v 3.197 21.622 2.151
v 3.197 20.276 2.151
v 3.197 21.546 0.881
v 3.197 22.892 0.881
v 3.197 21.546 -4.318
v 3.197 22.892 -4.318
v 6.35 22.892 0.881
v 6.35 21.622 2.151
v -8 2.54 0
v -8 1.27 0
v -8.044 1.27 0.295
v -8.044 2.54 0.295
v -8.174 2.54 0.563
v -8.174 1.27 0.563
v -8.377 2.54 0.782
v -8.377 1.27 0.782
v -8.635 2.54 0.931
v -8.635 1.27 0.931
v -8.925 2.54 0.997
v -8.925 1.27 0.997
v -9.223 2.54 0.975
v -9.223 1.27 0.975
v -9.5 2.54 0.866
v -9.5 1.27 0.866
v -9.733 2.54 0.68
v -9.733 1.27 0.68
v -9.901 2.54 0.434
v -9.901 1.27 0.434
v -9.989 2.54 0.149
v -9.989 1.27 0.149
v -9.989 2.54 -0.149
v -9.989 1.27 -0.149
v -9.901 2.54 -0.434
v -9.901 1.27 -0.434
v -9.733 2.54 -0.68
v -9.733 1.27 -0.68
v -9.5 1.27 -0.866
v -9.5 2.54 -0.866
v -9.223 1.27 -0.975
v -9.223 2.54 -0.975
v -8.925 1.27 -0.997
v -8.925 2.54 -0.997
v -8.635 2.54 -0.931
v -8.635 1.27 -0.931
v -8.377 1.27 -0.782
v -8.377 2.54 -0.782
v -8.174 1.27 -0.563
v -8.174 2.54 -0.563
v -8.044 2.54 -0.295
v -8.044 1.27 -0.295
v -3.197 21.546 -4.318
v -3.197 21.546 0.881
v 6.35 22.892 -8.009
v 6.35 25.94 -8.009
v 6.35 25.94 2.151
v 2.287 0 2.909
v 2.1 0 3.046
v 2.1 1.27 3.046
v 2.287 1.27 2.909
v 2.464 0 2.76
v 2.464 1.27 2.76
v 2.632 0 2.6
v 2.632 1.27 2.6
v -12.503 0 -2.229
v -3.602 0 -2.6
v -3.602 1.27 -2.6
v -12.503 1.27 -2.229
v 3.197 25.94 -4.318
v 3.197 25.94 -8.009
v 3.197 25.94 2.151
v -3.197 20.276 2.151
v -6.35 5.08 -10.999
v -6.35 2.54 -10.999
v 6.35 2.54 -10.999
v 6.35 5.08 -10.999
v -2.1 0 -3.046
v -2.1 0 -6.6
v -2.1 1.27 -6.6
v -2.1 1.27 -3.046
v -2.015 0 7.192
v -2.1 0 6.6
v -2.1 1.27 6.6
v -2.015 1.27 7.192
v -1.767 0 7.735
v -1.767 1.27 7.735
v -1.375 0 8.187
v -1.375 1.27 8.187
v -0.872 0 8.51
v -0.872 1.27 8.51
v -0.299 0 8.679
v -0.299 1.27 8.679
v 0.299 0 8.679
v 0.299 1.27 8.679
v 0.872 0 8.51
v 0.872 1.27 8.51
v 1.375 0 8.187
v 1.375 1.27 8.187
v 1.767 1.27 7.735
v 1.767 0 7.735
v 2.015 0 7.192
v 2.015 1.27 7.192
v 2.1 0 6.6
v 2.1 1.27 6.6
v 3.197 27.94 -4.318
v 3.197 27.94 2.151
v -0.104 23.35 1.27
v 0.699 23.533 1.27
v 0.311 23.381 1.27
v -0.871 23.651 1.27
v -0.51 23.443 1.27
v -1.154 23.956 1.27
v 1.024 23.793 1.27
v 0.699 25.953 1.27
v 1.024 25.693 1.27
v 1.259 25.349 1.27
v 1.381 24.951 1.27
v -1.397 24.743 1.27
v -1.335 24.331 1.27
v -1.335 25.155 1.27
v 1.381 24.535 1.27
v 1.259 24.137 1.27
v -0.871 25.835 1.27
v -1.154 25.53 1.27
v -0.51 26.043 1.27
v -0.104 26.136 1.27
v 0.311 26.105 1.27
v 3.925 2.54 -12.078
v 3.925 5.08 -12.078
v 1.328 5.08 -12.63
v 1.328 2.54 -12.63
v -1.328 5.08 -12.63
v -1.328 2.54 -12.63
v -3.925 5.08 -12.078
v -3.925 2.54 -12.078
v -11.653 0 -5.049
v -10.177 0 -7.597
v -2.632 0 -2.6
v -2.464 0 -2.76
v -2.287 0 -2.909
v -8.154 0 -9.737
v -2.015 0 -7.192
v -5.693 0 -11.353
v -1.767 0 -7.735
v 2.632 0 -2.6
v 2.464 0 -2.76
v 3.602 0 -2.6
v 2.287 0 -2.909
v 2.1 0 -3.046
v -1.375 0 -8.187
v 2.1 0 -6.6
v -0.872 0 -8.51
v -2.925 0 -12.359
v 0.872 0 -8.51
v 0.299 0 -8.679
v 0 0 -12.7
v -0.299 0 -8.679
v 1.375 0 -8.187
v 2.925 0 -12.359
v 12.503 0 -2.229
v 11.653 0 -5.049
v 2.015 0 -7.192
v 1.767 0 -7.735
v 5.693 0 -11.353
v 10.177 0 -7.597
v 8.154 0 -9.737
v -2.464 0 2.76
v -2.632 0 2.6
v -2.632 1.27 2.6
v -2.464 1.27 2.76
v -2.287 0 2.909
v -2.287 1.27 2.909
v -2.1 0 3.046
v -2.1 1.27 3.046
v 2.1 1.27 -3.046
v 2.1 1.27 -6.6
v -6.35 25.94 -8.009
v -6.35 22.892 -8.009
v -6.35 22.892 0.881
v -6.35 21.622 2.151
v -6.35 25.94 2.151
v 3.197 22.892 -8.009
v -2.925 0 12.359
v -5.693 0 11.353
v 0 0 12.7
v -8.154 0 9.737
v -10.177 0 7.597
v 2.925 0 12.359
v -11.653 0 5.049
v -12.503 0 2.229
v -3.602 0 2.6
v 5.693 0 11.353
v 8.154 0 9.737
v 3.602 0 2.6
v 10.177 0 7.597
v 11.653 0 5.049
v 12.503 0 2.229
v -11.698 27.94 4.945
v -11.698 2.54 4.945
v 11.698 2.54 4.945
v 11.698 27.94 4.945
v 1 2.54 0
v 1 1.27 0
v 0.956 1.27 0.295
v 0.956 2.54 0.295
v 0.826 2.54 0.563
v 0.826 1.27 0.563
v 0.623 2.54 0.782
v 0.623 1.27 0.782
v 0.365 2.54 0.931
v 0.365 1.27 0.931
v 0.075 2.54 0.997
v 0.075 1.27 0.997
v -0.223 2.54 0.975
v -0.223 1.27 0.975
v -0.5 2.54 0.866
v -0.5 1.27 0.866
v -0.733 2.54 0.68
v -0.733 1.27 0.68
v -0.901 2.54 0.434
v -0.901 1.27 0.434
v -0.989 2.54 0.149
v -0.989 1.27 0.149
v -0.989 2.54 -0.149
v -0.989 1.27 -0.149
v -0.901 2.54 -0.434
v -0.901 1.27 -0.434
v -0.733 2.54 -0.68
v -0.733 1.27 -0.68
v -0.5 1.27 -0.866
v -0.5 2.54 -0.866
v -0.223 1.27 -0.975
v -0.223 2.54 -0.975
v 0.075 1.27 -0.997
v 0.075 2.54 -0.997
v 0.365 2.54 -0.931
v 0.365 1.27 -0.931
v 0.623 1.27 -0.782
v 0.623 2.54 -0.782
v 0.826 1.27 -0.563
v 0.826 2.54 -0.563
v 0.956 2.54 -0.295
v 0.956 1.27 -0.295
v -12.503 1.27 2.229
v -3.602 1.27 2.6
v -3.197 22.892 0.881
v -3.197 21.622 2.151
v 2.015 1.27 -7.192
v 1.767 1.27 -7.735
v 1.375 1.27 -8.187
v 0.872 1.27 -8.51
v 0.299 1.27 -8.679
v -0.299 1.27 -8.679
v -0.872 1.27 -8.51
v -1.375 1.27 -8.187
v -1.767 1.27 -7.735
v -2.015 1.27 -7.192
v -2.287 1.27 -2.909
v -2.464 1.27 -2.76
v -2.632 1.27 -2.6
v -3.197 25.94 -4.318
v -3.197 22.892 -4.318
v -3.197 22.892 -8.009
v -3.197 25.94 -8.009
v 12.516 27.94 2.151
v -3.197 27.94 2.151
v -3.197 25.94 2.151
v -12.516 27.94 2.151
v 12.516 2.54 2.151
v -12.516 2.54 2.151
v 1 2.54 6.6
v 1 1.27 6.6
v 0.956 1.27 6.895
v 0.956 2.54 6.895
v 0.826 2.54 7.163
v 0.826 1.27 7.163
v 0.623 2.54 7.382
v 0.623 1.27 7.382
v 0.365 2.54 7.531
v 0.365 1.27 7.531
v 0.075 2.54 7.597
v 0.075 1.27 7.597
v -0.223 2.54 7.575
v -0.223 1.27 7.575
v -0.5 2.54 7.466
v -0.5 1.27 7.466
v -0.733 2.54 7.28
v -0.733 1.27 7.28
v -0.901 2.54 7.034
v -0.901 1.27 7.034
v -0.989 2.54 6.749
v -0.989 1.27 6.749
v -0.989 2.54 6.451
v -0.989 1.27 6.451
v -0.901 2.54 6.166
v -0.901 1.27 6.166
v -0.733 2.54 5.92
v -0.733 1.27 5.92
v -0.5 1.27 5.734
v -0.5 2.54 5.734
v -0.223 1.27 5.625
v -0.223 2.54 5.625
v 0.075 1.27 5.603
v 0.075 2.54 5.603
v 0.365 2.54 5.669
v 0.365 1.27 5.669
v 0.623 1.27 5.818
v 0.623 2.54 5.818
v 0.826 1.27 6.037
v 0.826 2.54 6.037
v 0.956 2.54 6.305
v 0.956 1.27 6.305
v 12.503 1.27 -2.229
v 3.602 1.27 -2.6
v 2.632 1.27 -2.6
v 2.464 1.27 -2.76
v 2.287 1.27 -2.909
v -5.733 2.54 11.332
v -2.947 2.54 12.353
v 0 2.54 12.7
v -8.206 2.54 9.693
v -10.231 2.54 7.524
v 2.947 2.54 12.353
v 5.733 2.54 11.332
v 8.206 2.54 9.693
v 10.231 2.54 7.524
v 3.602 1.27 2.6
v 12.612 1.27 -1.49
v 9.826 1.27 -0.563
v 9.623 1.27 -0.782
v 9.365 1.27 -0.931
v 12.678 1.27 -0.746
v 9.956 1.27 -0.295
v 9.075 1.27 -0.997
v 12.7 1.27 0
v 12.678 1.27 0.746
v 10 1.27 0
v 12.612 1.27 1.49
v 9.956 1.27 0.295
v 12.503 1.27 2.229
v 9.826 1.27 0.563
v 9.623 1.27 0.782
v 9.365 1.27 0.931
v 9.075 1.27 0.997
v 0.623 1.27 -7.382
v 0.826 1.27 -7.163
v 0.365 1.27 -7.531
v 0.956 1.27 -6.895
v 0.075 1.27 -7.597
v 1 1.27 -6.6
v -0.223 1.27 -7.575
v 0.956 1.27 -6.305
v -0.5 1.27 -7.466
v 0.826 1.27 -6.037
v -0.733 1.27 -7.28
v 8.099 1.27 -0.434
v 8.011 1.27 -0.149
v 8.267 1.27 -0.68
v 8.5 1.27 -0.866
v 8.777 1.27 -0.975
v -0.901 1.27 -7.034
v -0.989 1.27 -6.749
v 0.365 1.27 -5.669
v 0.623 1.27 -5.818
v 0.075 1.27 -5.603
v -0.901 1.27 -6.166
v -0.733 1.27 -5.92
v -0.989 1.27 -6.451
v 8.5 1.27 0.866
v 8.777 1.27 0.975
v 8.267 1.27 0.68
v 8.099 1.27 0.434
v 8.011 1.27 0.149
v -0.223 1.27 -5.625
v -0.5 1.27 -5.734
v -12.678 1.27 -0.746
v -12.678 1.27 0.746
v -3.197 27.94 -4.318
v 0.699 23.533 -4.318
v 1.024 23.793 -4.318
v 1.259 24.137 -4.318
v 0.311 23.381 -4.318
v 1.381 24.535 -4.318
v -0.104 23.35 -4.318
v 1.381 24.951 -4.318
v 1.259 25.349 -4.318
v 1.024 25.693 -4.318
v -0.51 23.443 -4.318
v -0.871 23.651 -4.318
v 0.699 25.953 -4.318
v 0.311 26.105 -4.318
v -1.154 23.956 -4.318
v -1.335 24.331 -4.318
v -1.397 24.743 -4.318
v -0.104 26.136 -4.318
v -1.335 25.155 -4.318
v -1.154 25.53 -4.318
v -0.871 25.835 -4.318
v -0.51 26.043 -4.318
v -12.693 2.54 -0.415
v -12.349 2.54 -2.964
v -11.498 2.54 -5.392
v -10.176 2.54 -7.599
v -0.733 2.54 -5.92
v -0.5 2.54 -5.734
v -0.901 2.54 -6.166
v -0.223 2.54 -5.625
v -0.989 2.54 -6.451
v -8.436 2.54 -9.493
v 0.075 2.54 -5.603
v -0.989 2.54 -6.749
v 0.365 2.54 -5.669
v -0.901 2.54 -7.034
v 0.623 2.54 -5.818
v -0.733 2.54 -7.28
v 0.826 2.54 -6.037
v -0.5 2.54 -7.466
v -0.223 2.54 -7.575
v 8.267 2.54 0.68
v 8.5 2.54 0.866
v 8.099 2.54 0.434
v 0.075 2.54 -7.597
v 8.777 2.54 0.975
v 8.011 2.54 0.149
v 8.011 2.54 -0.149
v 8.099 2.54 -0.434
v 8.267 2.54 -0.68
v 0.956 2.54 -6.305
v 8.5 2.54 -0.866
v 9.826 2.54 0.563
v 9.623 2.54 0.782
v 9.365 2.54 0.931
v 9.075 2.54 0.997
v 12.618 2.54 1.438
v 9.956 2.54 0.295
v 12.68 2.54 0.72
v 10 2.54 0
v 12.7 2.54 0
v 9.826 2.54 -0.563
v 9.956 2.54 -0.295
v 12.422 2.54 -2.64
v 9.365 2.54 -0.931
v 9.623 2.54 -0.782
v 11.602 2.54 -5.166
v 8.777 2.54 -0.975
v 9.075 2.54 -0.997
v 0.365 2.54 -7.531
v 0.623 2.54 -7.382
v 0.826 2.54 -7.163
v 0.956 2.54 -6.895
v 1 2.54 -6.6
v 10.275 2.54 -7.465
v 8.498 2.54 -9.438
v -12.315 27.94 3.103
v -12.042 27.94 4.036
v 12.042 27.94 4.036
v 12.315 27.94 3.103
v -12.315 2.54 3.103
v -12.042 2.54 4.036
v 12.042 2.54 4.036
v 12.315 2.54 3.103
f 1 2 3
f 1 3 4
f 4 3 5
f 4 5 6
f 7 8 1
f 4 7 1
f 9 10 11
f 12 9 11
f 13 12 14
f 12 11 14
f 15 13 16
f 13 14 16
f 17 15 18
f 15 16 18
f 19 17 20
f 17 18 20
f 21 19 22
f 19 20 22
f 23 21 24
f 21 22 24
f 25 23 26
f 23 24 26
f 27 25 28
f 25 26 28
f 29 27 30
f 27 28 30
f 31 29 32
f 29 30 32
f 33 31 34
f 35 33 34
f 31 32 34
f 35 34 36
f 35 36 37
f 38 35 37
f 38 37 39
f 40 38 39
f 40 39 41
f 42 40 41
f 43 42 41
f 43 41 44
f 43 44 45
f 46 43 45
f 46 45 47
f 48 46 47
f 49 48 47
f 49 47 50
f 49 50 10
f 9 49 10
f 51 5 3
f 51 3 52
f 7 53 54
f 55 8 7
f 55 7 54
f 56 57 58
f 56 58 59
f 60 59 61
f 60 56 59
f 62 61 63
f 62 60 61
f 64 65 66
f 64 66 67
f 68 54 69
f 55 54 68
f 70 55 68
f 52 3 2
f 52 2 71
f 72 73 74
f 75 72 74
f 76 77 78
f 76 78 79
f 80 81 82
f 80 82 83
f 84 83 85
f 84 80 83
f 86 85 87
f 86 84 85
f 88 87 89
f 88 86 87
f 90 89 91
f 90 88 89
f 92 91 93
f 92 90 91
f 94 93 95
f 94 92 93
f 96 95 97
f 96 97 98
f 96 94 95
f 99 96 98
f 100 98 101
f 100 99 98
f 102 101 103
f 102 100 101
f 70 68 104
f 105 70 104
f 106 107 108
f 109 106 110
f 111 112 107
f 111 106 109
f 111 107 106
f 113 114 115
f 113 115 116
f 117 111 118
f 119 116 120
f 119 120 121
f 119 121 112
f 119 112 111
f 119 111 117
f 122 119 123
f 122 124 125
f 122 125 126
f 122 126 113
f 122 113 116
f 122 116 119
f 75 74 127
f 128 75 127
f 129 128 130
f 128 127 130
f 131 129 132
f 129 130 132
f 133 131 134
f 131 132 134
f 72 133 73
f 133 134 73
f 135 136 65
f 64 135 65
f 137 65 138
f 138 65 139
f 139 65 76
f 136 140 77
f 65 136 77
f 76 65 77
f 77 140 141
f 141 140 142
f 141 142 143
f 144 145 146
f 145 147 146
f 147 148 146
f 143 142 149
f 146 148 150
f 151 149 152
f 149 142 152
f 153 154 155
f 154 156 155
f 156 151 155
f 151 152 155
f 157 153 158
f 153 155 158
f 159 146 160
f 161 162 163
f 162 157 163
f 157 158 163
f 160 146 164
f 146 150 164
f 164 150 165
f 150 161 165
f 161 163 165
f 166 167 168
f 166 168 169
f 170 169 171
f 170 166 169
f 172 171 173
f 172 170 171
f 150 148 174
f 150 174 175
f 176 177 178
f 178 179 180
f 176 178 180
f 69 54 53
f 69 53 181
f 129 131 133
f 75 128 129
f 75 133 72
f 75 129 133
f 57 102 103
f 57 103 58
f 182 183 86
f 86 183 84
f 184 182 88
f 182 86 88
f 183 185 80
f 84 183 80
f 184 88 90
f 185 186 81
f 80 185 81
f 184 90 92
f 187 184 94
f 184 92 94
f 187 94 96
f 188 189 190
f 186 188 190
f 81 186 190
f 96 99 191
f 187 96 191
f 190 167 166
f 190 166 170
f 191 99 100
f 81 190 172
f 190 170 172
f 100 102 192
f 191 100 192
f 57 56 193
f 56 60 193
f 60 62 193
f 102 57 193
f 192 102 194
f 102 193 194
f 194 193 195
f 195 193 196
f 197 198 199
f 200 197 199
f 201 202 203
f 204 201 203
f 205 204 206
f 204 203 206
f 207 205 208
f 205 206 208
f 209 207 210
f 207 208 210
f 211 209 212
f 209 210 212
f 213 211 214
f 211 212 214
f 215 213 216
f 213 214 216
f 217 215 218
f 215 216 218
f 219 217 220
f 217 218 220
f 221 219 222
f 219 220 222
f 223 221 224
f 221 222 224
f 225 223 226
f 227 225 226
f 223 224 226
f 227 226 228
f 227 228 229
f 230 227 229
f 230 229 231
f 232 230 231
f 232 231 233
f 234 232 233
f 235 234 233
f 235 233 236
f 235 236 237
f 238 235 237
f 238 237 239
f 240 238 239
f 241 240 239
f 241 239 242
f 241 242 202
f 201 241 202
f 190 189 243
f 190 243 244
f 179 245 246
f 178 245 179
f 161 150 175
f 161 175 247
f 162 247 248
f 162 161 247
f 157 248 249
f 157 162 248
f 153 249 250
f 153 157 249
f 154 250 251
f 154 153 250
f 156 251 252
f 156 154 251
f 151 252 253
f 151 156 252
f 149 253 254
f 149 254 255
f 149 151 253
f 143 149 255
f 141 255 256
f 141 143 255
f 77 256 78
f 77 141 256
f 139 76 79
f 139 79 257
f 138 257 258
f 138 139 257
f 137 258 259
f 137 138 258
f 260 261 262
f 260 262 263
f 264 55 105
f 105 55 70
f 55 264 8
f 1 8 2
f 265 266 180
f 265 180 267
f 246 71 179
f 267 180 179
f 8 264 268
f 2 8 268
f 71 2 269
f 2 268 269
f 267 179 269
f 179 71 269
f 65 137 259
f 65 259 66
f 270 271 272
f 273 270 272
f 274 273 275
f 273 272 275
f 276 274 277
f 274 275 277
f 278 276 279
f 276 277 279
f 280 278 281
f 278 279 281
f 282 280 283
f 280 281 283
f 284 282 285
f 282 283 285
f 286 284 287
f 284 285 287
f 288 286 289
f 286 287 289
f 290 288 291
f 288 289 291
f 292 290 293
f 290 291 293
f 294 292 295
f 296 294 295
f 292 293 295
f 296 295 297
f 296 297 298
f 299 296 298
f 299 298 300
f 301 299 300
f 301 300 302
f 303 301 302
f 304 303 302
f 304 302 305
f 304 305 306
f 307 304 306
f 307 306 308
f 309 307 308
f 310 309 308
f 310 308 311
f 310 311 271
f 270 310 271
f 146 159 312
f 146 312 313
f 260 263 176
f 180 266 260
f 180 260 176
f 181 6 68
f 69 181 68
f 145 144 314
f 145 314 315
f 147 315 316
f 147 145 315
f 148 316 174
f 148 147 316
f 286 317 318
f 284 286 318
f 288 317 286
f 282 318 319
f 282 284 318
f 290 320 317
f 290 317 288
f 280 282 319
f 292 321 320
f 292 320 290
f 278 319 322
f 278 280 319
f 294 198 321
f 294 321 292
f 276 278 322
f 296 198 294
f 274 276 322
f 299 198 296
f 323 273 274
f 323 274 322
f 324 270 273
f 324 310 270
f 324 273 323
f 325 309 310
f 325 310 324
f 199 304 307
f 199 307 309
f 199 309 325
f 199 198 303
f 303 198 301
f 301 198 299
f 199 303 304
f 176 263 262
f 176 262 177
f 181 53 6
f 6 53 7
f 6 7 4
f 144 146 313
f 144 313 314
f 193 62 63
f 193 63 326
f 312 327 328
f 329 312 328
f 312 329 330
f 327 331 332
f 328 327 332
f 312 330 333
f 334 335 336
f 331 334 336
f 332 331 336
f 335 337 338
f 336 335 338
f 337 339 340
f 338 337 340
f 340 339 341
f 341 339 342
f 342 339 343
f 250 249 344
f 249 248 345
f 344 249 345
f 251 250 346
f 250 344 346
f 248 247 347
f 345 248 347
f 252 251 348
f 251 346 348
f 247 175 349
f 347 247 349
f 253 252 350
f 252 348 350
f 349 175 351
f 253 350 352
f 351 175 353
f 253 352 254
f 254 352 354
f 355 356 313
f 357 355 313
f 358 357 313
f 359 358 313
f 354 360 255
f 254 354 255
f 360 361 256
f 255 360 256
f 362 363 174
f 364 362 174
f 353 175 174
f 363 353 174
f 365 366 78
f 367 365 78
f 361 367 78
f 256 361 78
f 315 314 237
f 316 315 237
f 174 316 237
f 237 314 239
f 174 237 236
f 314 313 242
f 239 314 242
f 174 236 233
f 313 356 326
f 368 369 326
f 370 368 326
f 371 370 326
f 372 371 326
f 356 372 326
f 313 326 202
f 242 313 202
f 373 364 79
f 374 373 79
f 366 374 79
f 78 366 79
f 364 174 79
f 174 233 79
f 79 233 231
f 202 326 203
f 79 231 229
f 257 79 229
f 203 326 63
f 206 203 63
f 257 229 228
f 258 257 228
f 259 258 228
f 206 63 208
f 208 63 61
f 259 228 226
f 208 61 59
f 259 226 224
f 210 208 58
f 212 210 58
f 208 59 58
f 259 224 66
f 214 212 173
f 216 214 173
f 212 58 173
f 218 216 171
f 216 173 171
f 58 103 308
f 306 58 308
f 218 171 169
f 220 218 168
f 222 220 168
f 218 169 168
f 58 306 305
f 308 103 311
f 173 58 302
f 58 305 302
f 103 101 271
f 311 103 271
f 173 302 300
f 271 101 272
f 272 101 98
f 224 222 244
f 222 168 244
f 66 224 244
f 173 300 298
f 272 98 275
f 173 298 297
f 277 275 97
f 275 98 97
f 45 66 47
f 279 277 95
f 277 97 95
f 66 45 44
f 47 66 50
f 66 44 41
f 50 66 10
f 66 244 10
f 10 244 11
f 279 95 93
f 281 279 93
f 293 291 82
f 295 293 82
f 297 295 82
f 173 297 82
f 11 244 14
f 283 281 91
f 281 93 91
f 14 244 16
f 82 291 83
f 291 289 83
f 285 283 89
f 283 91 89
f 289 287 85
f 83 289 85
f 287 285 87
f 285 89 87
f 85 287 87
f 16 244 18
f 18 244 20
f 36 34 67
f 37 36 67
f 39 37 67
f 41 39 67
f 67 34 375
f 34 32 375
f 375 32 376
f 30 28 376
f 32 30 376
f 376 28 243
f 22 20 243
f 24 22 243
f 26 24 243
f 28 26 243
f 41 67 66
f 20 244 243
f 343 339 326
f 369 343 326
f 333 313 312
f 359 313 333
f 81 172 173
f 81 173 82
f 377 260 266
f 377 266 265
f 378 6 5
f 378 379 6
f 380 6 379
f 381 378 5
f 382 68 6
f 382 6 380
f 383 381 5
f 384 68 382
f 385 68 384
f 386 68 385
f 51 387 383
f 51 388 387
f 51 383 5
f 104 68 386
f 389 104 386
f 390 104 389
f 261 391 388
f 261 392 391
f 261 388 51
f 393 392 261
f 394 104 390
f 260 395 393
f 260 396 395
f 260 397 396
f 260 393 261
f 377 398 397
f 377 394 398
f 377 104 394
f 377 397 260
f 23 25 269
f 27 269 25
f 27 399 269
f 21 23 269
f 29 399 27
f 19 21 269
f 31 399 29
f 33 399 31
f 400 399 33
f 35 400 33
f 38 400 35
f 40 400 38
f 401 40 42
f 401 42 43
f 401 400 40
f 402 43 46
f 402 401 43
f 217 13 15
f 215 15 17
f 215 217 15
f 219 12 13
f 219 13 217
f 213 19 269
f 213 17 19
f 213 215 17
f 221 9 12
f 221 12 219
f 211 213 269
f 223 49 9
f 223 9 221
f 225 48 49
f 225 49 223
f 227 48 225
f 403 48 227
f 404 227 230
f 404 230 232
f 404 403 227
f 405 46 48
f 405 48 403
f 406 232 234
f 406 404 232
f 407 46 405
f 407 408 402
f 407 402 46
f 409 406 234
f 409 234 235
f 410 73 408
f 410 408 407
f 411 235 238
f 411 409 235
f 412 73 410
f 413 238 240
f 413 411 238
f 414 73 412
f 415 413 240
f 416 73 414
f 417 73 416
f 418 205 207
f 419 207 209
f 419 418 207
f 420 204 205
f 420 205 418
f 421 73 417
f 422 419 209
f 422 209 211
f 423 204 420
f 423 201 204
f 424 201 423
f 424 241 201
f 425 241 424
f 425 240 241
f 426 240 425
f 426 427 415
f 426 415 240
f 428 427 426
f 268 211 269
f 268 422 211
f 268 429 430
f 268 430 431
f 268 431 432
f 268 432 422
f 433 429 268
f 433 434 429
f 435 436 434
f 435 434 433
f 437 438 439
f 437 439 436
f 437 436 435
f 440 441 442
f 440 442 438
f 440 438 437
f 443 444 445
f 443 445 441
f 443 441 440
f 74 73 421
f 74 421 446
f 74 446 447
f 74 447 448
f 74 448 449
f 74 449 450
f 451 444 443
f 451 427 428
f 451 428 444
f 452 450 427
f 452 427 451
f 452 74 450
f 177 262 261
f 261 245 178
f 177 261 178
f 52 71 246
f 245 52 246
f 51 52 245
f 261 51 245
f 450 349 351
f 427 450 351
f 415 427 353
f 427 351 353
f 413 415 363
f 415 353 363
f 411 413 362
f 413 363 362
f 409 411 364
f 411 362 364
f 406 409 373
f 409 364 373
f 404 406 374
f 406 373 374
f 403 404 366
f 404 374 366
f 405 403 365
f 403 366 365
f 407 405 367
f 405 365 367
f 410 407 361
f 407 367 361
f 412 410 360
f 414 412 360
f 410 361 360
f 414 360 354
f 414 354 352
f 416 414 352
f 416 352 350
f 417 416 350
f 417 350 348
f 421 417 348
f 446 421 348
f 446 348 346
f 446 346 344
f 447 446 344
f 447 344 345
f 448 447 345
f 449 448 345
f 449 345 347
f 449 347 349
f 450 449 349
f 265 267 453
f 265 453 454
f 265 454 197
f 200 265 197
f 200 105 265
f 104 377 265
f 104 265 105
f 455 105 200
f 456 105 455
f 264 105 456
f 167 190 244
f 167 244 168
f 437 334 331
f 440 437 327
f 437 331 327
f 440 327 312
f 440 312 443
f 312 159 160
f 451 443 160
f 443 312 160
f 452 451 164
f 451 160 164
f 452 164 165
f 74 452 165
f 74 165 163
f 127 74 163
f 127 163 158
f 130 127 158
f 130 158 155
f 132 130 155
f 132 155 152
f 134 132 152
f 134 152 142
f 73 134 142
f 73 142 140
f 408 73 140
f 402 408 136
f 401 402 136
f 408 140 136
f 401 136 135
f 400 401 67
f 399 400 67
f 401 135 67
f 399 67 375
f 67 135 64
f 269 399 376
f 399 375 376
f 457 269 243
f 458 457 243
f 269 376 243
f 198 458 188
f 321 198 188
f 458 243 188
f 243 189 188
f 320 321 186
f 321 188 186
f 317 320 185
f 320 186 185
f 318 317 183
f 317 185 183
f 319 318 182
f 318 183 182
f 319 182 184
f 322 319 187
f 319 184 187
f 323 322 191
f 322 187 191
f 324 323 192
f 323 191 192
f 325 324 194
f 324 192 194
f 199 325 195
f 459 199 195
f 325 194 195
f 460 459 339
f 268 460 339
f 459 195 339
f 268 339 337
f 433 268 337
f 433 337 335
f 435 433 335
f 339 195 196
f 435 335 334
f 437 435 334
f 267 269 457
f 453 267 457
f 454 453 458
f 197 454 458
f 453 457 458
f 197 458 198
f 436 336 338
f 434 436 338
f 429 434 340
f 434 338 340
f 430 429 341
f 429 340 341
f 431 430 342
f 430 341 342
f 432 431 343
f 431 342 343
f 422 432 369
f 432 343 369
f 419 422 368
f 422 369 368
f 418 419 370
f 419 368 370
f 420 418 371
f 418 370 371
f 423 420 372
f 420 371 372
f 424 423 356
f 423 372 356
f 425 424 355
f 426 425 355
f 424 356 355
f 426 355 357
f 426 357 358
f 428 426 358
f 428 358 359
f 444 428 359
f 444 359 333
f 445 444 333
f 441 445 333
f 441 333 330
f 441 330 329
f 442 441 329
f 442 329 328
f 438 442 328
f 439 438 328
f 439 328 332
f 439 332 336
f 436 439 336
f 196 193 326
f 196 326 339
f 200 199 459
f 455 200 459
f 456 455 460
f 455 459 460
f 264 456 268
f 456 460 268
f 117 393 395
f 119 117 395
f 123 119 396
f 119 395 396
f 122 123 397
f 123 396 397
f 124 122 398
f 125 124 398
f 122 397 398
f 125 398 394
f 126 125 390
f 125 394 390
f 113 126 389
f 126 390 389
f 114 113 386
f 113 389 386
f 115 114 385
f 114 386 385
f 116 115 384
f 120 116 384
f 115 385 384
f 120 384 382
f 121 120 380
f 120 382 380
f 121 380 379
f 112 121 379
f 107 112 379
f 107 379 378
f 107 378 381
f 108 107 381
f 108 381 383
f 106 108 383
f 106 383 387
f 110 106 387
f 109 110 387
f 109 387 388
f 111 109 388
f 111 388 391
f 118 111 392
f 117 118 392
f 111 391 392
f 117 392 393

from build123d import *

# Parameters (mm, degrees)
SKETCH1_R           = 12.7
BOSS_EXTRUDE1_DEPTH = 2.54
BOSS_EXTRUDE2_DEPTH = 25.4
BOSS_EXTRUDE3_REACH = 19.018
SKETCH3_W           = 6.393920166
SKETCH3_H           = 6.393920167
SKETCH4_R           = 1.397
CUT_EXTRUDE1_DEPTH  = 5.588
CUT_EXTRUDE2_REACH  = 29.94
SKETCH6_R           = 1
CUT_EXTRUDE4_DEPTH  = 1.27
SKETCH10_W          = 3.153039917
SKETCH10_H          = 3.048
BOSS_EXTRUDE4_DEPTH = 10.16
CHAMFER1_SIZE       = 1.27
BOSS_EXTRUDE5_DEPTH = 2.54


with BuildPart() as part:
    # Sketch1 → Boss-Extrude1 (new body)
    with BuildSketch(Plane(origin=(0, 0, 0), x_dir=(1, 0, 0), z_dir=(0, 1, 0))):
        Circle(SKETCH1_R)
    extrude(amount=BOSS_EXTRUDE1_DEPTH)

    # Sketch2 → Boss-Extrude2 (add)
    with BuildSketch(Plane(origin=(0, 2.54, 0), x_dir=(1, 0, 0), z_dir=(0, 1, 0))):
        with BuildLine():
            Line((12.516478449, -2.151224589), (-12.516478449, -2.151224589))
            ThreePointArc((-12.516478449, -2.151224589), (-12.187390109, -3.571767395), (-11.697638811, -4.945224589))
            Line((-11.697638811, -4.945224589), (11.697638811, -4.945224589))
            ThreePointArc((11.697638811, -4.945224589), (12.187390109, -3.571767395), (12.516478449, -2.151224589))
        make_face()
    extrude(amount=BOSS_EXTRUDE2_DEPTH)

    # Sketch3 → Boss-Extrude3 (add, up to next)
    with BuildSketch(Plane(origin=(0, 0, -4.318), x_dir=(-1, 0, 0), z_dir=(0, 0, -1)), mode=Mode.PRIVATE) as boss_extrude3_sk1:
        with Locations((0, 24.743039917)):
            Rectangle(SKETCH3_W, SKETCH3_H)
    boss_extrude3_tool1 = extrude(boss_extrude3_sk1.sketch, amount=-BOSS_EXTRUDE3_REACH, mode=Mode.PRIVATE) - part.part
    add(boss_extrude3_tool1.solids().sort_by_distance((0, 24.74304, -4.318))[0])

    # Sketch4 → Cut-Extrude1 (cut)
    with BuildSketch(Plane(origin=(0, 0, -4.318), x_dir=(-1, 0, 0), z_dir=(0, 0, -1))):
        with Locations((0, 24.743039917)):
            Circle(SKETCH4_R)
    extrude(amount=-CUT_EXTRUDE1_DEPTH, mode=Mode.SUBTRACT)

    # Sketch6 → Cut-Extrude2 (cut, up to next)
    with BuildSketch(Plane.XZ, mode=Mode.PRIVATE) as cut_extrude2_sk1:
        with Locations((9, 0)):
            Circle(SKETCH6_R)
    cut_extrude2_tool1 = extrude(cut_extrude2_sk1.sketch, amount=-CUT_EXTRUDE2_REACH, mode=Mode.PRIVATE) & part.part
    add(cut_extrude2_tool1.solids().sort_by_distance((9, 0, 0))[0], mode=Mode.SUBTRACT)
    # Sketch6 → Cut-Extrude2 (cut, up to next)
    with BuildSketch(Plane.XZ, mode=Mode.PRIVATE) as cut_extrude2_sk2:
        with Locations((0, -6.6)):
            Circle(SKETCH6_R)
    cut_extrude2_tool2 = extrude(cut_extrude2_sk2.sketch, amount=-CUT_EXTRUDE2_REACH, mode=Mode.PRIVATE) & part.part
    add(cut_extrude2_tool2.solids().sort_by_distance((0, 0, -6.6))[0], mode=Mode.SUBTRACT)
    # Sketch6 → Cut-Extrude2 (cut, up to next)
    with BuildSketch(Plane.XZ, mode=Mode.PRIVATE) as cut_extrude2_sk3:
        with Locations((-9, 0)):
            Circle(SKETCH6_R)
    cut_extrude2_tool3 = extrude(cut_extrude2_sk3.sketch, amount=-CUT_EXTRUDE2_REACH, mode=Mode.PRIVATE) & part.part
    add(cut_extrude2_tool3.solids().sort_by_distance((-9, 0, 0))[0], mode=Mode.SUBTRACT)
    # Sketch6 → Cut-Extrude2 (cut, up to next)
    with BuildSketch(Plane.XZ, mode=Mode.PRIVATE) as cut_extrude2_sk4:
        with Locations((0, 6.6)):
            Circle(SKETCH6_R)
    cut_extrude2_tool4 = extrude(cut_extrude2_sk4.sketch, amount=-CUT_EXTRUDE2_REACH, mode=Mode.PRIVATE) & part.part
    add(cut_extrude2_tool4.solids().sort_by_distance((0, 0, 6.6))[0], mode=Mode.SUBTRACT)
    # Sketch6 → Cut-Extrude2 (cut, up to next)
    with BuildSketch(Plane.XZ, mode=Mode.PRIVATE) as cut_extrude2_sk5:
        Circle(SKETCH6_R)
    cut_extrude2_tool5 = extrude(cut_extrude2_sk5.sketch, amount=-CUT_EXTRUDE2_REACH, mode=Mode.PRIVATE) & part.part
    add(cut_extrude2_tool5.solids().sort_by_distance((0, 0, 0))[0], mode=Mode.SUBTRACT)

    # Sketch9 → Cut-Extrude4 (cut)
    with BuildSketch(Plane.XZ):
        with BuildLine():
            Line((-2.1, -6.6), (-2.1, -3.046309242))
            ThreePointArc((-2.1, -3.046309242), (-2.376743942, -2.835681264), (-2.632489316, -2.6))
            Line((-2.632489316, -2.6), (-3.60208243, -2.6))
            Line((-3.60208243, -2.6), (-15.602107818, -2.099998942))
            ThreePointArc((-15.602107818, -2.099998942), (-17.7, 0), (-15.602107818, 2.099998942))
            Line((-15.602107818, 2.099998942), (-3.60208243, 2.6))
            Line((-3.60208243, 2.6), (-2.632489316, 2.6))
            ThreePointArc((-2.632489316, 2.6), (-2.376743942, 2.835681264), (-2.1, 3.046309242))
            Line((-2.1, 3.046309242), (-2.1, 6.6))
            ThreePointArc((-2.1, 6.6), (0, 8.7), (2.1, 6.6))
            Line((2.1, 6.6), (2.1, 3.046309242))
            ThreePointArc((2.1, 3.046309242), (2.376743942, 2.835681264), (2.632489316, 2.6))
            Line((2.632489316, 2.6), (3.60208243, 2.6))
            Line((3.60208243, 2.6), (15.602107818, 2.099998942))
            ThreePointArc((15.602107818, 2.099998942), (17.7, 0), (15.602107818, -2.099998942))
            Line((15.602107818, -2.099998942), (3.60208243, -2.6))
            Line((3.60208243, -2.6), (2.632489316, -2.6))
            ThreePointArc((2.632489316, -2.6), (2.376743942, -2.835681264), (2.1, -3.046309242))
            Line((2.1, -3.046309242), (2.1, -6.6))
            ThreePointArc((2.1, -6.6), (0, -8.7), (-2.1, -6.6))
        make_face()
    extrude(amount=-CUT_EXTRUDE4_DEPTH, mode=Mode.SUBTRACT)

    # Sketch10 → Boss-Extrude4 (add)
    with BuildSketch(Plane(origin=(0, 0, 2.151224589), x_dir=(-1, 0, 0), z_dir=(0, 0, -1))):
        with Locations((-4.773480042, 24.416)):
            Rectangle(SKETCH10_W, SKETCH10_H)
        with Locations((4.773480042, 24.416)):
            Rectangle(SKETCH10_W, SKETCH10_H)
    extrude(amount=BOSS_EXTRUDE4_DEPTH)

    # Chamfer1
    chamfer1_edges = [part.edges().sort_by_distance(p)[0] for p in [
        (4.773480042, 22.892, 2.151224589),
        (-4.773480042, 22.892, 2.151224589),
        (0, 21.546079833, 2.151224589),
    ]]
    chamfer(chamfer1_edges, length=CHAMFER1_SIZE)

    # Sketch11 → Boss-Extrude5 (add)
    with BuildSketch(Plane(origin=(0, 2.54, 0), x_dir=(1, 0, 0), z_dir=(0, 1, 0))):
        with BuildLine():
            Line((-6.35, 10.998522628), (6.35, 10.998522628))
            ThreePointArc((6.35, 10.998522628), (0, 12.7), (-6.35, 10.998522628))
        make_face()
    extrude(amount=BOSS_EXTRUDE5_DEPTH)


solid = part.part
